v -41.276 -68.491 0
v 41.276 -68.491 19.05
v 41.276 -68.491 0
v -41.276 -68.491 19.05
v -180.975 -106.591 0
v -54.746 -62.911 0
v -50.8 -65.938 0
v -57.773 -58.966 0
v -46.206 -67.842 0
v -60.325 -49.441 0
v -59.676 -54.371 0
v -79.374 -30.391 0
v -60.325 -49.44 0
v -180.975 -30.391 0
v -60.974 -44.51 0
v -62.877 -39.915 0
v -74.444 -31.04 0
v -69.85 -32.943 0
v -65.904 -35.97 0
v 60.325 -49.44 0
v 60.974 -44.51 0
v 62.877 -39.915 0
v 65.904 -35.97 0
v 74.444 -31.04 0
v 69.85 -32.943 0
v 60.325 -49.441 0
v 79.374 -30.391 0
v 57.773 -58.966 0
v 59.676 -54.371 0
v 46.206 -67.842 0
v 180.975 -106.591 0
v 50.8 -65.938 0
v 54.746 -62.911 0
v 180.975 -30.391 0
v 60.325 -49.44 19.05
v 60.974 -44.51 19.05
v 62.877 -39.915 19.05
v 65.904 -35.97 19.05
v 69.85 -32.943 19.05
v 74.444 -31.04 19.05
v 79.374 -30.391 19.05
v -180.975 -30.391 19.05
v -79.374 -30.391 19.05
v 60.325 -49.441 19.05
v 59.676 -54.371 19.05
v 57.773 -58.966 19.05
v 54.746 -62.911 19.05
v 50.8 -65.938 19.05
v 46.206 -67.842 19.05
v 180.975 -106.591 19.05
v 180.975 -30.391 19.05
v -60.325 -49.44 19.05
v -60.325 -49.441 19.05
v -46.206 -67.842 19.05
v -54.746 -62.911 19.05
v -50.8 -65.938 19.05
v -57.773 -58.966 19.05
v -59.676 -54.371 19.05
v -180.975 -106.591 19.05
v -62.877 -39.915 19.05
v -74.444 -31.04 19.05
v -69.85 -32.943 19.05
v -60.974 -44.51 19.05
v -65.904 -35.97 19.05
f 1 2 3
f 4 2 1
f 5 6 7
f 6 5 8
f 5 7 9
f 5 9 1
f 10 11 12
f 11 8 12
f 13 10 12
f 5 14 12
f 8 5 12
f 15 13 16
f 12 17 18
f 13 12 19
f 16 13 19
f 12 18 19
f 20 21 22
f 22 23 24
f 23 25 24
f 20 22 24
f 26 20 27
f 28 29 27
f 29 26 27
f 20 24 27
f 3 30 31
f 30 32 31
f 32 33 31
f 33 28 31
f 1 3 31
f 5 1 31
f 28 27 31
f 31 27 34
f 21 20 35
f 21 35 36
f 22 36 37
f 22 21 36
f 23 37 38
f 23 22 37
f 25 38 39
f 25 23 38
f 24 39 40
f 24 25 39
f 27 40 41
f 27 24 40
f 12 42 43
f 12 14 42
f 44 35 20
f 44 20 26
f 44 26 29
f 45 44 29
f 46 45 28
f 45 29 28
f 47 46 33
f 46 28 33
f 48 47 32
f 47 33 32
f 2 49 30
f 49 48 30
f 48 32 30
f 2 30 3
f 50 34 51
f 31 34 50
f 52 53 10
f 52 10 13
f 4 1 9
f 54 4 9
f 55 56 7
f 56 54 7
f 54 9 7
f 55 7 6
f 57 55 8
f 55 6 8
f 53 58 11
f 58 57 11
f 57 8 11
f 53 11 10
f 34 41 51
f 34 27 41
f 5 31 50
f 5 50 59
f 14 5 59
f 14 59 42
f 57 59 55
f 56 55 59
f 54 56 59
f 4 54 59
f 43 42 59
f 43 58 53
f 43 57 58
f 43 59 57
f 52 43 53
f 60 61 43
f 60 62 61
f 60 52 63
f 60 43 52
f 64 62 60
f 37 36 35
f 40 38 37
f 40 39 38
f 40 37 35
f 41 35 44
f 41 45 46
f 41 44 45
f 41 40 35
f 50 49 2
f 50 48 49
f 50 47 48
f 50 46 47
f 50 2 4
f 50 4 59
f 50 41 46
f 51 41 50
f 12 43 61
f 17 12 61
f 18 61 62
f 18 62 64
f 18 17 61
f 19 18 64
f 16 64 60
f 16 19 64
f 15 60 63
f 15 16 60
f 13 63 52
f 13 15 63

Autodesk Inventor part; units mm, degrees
ref_plane "YZ Plane" through (0, 0, 0) normal (1, 0, 0) x (0, 1, 0)
ref_plane "XZ Plane" through (0, 0, 0) normal (0, 1, 0) x (-1, 0, 0)
ref_plane "XY Plane" through (0, 0, 0) normal (0, 0, 1) x (1, 0, 0)
sketch "Sketch1" plane through (0, 0, 0) normal (0, 0, 1) x (1, 0, 0)
  line L0 (-180.975, -30.3906) -> (180.975, -30.3906)
  line L1 (180.975, -30.3906) -> (180.975, -106.5906)
  line L2 (180.975, -106.5906) -> (-180.975, -106.5906)
  line L3 (-180.975, -106.5906) -> (-180.975, -30.3906)
  line L4 (0, 21.3181) -> (0, -127.9087) projected
  point P0 (0, 0)
  dimension "d0" = 361.95
  dimension "d1" = 76.2
  dimension "d4" = 180.975
extrude "Extrusion1" add sketch "Sketch1" along normal blind 19.05
sketch "Sketch2" plane through (0, 0, 19.05) normal (0, 0, 1) x (1, 0, 0)
  line L0 (0, 21.3181) -> (0, -127.9087) projected
  line L1 (180.975, -30.3906) -> (-180.975, -30.3906) projected
  line L2 (-60.325, -30.3906) -> (60.325, -30.3906)
  line L3 (60.325, -30.3906) -> (60.325, -68.4906)
  line L4 (60.325, -68.4906) -> (-60.325, -68.4906)
  line L5 (-60.325, -68.4906) -> (-60.325, -30.3906)
  point P0 (0, 0)
  dimension "d5" = 120.65
  dimension "d6" = 60.325
  dimension "d7" = 38.1
extrude "Extrusion2" cut sketch "Sketch2" against normal blind 19.05
fillet "Fillet1" radius 19.05 4 edges at (-60.325, -30.3906, 9.525) (60.325, -30.3906, 9.525) (60.325, -68.4906, 9.525) (-60.325, -68.4906, 9.525)
equation "\"d4\" = 0.5 * d0"
equation "\"d5\" = 0.333333 * d0"
equation "\"d6\" = 0.5 * d5"
properties part number "Drawer ends" material "Wood (Cherry)"
